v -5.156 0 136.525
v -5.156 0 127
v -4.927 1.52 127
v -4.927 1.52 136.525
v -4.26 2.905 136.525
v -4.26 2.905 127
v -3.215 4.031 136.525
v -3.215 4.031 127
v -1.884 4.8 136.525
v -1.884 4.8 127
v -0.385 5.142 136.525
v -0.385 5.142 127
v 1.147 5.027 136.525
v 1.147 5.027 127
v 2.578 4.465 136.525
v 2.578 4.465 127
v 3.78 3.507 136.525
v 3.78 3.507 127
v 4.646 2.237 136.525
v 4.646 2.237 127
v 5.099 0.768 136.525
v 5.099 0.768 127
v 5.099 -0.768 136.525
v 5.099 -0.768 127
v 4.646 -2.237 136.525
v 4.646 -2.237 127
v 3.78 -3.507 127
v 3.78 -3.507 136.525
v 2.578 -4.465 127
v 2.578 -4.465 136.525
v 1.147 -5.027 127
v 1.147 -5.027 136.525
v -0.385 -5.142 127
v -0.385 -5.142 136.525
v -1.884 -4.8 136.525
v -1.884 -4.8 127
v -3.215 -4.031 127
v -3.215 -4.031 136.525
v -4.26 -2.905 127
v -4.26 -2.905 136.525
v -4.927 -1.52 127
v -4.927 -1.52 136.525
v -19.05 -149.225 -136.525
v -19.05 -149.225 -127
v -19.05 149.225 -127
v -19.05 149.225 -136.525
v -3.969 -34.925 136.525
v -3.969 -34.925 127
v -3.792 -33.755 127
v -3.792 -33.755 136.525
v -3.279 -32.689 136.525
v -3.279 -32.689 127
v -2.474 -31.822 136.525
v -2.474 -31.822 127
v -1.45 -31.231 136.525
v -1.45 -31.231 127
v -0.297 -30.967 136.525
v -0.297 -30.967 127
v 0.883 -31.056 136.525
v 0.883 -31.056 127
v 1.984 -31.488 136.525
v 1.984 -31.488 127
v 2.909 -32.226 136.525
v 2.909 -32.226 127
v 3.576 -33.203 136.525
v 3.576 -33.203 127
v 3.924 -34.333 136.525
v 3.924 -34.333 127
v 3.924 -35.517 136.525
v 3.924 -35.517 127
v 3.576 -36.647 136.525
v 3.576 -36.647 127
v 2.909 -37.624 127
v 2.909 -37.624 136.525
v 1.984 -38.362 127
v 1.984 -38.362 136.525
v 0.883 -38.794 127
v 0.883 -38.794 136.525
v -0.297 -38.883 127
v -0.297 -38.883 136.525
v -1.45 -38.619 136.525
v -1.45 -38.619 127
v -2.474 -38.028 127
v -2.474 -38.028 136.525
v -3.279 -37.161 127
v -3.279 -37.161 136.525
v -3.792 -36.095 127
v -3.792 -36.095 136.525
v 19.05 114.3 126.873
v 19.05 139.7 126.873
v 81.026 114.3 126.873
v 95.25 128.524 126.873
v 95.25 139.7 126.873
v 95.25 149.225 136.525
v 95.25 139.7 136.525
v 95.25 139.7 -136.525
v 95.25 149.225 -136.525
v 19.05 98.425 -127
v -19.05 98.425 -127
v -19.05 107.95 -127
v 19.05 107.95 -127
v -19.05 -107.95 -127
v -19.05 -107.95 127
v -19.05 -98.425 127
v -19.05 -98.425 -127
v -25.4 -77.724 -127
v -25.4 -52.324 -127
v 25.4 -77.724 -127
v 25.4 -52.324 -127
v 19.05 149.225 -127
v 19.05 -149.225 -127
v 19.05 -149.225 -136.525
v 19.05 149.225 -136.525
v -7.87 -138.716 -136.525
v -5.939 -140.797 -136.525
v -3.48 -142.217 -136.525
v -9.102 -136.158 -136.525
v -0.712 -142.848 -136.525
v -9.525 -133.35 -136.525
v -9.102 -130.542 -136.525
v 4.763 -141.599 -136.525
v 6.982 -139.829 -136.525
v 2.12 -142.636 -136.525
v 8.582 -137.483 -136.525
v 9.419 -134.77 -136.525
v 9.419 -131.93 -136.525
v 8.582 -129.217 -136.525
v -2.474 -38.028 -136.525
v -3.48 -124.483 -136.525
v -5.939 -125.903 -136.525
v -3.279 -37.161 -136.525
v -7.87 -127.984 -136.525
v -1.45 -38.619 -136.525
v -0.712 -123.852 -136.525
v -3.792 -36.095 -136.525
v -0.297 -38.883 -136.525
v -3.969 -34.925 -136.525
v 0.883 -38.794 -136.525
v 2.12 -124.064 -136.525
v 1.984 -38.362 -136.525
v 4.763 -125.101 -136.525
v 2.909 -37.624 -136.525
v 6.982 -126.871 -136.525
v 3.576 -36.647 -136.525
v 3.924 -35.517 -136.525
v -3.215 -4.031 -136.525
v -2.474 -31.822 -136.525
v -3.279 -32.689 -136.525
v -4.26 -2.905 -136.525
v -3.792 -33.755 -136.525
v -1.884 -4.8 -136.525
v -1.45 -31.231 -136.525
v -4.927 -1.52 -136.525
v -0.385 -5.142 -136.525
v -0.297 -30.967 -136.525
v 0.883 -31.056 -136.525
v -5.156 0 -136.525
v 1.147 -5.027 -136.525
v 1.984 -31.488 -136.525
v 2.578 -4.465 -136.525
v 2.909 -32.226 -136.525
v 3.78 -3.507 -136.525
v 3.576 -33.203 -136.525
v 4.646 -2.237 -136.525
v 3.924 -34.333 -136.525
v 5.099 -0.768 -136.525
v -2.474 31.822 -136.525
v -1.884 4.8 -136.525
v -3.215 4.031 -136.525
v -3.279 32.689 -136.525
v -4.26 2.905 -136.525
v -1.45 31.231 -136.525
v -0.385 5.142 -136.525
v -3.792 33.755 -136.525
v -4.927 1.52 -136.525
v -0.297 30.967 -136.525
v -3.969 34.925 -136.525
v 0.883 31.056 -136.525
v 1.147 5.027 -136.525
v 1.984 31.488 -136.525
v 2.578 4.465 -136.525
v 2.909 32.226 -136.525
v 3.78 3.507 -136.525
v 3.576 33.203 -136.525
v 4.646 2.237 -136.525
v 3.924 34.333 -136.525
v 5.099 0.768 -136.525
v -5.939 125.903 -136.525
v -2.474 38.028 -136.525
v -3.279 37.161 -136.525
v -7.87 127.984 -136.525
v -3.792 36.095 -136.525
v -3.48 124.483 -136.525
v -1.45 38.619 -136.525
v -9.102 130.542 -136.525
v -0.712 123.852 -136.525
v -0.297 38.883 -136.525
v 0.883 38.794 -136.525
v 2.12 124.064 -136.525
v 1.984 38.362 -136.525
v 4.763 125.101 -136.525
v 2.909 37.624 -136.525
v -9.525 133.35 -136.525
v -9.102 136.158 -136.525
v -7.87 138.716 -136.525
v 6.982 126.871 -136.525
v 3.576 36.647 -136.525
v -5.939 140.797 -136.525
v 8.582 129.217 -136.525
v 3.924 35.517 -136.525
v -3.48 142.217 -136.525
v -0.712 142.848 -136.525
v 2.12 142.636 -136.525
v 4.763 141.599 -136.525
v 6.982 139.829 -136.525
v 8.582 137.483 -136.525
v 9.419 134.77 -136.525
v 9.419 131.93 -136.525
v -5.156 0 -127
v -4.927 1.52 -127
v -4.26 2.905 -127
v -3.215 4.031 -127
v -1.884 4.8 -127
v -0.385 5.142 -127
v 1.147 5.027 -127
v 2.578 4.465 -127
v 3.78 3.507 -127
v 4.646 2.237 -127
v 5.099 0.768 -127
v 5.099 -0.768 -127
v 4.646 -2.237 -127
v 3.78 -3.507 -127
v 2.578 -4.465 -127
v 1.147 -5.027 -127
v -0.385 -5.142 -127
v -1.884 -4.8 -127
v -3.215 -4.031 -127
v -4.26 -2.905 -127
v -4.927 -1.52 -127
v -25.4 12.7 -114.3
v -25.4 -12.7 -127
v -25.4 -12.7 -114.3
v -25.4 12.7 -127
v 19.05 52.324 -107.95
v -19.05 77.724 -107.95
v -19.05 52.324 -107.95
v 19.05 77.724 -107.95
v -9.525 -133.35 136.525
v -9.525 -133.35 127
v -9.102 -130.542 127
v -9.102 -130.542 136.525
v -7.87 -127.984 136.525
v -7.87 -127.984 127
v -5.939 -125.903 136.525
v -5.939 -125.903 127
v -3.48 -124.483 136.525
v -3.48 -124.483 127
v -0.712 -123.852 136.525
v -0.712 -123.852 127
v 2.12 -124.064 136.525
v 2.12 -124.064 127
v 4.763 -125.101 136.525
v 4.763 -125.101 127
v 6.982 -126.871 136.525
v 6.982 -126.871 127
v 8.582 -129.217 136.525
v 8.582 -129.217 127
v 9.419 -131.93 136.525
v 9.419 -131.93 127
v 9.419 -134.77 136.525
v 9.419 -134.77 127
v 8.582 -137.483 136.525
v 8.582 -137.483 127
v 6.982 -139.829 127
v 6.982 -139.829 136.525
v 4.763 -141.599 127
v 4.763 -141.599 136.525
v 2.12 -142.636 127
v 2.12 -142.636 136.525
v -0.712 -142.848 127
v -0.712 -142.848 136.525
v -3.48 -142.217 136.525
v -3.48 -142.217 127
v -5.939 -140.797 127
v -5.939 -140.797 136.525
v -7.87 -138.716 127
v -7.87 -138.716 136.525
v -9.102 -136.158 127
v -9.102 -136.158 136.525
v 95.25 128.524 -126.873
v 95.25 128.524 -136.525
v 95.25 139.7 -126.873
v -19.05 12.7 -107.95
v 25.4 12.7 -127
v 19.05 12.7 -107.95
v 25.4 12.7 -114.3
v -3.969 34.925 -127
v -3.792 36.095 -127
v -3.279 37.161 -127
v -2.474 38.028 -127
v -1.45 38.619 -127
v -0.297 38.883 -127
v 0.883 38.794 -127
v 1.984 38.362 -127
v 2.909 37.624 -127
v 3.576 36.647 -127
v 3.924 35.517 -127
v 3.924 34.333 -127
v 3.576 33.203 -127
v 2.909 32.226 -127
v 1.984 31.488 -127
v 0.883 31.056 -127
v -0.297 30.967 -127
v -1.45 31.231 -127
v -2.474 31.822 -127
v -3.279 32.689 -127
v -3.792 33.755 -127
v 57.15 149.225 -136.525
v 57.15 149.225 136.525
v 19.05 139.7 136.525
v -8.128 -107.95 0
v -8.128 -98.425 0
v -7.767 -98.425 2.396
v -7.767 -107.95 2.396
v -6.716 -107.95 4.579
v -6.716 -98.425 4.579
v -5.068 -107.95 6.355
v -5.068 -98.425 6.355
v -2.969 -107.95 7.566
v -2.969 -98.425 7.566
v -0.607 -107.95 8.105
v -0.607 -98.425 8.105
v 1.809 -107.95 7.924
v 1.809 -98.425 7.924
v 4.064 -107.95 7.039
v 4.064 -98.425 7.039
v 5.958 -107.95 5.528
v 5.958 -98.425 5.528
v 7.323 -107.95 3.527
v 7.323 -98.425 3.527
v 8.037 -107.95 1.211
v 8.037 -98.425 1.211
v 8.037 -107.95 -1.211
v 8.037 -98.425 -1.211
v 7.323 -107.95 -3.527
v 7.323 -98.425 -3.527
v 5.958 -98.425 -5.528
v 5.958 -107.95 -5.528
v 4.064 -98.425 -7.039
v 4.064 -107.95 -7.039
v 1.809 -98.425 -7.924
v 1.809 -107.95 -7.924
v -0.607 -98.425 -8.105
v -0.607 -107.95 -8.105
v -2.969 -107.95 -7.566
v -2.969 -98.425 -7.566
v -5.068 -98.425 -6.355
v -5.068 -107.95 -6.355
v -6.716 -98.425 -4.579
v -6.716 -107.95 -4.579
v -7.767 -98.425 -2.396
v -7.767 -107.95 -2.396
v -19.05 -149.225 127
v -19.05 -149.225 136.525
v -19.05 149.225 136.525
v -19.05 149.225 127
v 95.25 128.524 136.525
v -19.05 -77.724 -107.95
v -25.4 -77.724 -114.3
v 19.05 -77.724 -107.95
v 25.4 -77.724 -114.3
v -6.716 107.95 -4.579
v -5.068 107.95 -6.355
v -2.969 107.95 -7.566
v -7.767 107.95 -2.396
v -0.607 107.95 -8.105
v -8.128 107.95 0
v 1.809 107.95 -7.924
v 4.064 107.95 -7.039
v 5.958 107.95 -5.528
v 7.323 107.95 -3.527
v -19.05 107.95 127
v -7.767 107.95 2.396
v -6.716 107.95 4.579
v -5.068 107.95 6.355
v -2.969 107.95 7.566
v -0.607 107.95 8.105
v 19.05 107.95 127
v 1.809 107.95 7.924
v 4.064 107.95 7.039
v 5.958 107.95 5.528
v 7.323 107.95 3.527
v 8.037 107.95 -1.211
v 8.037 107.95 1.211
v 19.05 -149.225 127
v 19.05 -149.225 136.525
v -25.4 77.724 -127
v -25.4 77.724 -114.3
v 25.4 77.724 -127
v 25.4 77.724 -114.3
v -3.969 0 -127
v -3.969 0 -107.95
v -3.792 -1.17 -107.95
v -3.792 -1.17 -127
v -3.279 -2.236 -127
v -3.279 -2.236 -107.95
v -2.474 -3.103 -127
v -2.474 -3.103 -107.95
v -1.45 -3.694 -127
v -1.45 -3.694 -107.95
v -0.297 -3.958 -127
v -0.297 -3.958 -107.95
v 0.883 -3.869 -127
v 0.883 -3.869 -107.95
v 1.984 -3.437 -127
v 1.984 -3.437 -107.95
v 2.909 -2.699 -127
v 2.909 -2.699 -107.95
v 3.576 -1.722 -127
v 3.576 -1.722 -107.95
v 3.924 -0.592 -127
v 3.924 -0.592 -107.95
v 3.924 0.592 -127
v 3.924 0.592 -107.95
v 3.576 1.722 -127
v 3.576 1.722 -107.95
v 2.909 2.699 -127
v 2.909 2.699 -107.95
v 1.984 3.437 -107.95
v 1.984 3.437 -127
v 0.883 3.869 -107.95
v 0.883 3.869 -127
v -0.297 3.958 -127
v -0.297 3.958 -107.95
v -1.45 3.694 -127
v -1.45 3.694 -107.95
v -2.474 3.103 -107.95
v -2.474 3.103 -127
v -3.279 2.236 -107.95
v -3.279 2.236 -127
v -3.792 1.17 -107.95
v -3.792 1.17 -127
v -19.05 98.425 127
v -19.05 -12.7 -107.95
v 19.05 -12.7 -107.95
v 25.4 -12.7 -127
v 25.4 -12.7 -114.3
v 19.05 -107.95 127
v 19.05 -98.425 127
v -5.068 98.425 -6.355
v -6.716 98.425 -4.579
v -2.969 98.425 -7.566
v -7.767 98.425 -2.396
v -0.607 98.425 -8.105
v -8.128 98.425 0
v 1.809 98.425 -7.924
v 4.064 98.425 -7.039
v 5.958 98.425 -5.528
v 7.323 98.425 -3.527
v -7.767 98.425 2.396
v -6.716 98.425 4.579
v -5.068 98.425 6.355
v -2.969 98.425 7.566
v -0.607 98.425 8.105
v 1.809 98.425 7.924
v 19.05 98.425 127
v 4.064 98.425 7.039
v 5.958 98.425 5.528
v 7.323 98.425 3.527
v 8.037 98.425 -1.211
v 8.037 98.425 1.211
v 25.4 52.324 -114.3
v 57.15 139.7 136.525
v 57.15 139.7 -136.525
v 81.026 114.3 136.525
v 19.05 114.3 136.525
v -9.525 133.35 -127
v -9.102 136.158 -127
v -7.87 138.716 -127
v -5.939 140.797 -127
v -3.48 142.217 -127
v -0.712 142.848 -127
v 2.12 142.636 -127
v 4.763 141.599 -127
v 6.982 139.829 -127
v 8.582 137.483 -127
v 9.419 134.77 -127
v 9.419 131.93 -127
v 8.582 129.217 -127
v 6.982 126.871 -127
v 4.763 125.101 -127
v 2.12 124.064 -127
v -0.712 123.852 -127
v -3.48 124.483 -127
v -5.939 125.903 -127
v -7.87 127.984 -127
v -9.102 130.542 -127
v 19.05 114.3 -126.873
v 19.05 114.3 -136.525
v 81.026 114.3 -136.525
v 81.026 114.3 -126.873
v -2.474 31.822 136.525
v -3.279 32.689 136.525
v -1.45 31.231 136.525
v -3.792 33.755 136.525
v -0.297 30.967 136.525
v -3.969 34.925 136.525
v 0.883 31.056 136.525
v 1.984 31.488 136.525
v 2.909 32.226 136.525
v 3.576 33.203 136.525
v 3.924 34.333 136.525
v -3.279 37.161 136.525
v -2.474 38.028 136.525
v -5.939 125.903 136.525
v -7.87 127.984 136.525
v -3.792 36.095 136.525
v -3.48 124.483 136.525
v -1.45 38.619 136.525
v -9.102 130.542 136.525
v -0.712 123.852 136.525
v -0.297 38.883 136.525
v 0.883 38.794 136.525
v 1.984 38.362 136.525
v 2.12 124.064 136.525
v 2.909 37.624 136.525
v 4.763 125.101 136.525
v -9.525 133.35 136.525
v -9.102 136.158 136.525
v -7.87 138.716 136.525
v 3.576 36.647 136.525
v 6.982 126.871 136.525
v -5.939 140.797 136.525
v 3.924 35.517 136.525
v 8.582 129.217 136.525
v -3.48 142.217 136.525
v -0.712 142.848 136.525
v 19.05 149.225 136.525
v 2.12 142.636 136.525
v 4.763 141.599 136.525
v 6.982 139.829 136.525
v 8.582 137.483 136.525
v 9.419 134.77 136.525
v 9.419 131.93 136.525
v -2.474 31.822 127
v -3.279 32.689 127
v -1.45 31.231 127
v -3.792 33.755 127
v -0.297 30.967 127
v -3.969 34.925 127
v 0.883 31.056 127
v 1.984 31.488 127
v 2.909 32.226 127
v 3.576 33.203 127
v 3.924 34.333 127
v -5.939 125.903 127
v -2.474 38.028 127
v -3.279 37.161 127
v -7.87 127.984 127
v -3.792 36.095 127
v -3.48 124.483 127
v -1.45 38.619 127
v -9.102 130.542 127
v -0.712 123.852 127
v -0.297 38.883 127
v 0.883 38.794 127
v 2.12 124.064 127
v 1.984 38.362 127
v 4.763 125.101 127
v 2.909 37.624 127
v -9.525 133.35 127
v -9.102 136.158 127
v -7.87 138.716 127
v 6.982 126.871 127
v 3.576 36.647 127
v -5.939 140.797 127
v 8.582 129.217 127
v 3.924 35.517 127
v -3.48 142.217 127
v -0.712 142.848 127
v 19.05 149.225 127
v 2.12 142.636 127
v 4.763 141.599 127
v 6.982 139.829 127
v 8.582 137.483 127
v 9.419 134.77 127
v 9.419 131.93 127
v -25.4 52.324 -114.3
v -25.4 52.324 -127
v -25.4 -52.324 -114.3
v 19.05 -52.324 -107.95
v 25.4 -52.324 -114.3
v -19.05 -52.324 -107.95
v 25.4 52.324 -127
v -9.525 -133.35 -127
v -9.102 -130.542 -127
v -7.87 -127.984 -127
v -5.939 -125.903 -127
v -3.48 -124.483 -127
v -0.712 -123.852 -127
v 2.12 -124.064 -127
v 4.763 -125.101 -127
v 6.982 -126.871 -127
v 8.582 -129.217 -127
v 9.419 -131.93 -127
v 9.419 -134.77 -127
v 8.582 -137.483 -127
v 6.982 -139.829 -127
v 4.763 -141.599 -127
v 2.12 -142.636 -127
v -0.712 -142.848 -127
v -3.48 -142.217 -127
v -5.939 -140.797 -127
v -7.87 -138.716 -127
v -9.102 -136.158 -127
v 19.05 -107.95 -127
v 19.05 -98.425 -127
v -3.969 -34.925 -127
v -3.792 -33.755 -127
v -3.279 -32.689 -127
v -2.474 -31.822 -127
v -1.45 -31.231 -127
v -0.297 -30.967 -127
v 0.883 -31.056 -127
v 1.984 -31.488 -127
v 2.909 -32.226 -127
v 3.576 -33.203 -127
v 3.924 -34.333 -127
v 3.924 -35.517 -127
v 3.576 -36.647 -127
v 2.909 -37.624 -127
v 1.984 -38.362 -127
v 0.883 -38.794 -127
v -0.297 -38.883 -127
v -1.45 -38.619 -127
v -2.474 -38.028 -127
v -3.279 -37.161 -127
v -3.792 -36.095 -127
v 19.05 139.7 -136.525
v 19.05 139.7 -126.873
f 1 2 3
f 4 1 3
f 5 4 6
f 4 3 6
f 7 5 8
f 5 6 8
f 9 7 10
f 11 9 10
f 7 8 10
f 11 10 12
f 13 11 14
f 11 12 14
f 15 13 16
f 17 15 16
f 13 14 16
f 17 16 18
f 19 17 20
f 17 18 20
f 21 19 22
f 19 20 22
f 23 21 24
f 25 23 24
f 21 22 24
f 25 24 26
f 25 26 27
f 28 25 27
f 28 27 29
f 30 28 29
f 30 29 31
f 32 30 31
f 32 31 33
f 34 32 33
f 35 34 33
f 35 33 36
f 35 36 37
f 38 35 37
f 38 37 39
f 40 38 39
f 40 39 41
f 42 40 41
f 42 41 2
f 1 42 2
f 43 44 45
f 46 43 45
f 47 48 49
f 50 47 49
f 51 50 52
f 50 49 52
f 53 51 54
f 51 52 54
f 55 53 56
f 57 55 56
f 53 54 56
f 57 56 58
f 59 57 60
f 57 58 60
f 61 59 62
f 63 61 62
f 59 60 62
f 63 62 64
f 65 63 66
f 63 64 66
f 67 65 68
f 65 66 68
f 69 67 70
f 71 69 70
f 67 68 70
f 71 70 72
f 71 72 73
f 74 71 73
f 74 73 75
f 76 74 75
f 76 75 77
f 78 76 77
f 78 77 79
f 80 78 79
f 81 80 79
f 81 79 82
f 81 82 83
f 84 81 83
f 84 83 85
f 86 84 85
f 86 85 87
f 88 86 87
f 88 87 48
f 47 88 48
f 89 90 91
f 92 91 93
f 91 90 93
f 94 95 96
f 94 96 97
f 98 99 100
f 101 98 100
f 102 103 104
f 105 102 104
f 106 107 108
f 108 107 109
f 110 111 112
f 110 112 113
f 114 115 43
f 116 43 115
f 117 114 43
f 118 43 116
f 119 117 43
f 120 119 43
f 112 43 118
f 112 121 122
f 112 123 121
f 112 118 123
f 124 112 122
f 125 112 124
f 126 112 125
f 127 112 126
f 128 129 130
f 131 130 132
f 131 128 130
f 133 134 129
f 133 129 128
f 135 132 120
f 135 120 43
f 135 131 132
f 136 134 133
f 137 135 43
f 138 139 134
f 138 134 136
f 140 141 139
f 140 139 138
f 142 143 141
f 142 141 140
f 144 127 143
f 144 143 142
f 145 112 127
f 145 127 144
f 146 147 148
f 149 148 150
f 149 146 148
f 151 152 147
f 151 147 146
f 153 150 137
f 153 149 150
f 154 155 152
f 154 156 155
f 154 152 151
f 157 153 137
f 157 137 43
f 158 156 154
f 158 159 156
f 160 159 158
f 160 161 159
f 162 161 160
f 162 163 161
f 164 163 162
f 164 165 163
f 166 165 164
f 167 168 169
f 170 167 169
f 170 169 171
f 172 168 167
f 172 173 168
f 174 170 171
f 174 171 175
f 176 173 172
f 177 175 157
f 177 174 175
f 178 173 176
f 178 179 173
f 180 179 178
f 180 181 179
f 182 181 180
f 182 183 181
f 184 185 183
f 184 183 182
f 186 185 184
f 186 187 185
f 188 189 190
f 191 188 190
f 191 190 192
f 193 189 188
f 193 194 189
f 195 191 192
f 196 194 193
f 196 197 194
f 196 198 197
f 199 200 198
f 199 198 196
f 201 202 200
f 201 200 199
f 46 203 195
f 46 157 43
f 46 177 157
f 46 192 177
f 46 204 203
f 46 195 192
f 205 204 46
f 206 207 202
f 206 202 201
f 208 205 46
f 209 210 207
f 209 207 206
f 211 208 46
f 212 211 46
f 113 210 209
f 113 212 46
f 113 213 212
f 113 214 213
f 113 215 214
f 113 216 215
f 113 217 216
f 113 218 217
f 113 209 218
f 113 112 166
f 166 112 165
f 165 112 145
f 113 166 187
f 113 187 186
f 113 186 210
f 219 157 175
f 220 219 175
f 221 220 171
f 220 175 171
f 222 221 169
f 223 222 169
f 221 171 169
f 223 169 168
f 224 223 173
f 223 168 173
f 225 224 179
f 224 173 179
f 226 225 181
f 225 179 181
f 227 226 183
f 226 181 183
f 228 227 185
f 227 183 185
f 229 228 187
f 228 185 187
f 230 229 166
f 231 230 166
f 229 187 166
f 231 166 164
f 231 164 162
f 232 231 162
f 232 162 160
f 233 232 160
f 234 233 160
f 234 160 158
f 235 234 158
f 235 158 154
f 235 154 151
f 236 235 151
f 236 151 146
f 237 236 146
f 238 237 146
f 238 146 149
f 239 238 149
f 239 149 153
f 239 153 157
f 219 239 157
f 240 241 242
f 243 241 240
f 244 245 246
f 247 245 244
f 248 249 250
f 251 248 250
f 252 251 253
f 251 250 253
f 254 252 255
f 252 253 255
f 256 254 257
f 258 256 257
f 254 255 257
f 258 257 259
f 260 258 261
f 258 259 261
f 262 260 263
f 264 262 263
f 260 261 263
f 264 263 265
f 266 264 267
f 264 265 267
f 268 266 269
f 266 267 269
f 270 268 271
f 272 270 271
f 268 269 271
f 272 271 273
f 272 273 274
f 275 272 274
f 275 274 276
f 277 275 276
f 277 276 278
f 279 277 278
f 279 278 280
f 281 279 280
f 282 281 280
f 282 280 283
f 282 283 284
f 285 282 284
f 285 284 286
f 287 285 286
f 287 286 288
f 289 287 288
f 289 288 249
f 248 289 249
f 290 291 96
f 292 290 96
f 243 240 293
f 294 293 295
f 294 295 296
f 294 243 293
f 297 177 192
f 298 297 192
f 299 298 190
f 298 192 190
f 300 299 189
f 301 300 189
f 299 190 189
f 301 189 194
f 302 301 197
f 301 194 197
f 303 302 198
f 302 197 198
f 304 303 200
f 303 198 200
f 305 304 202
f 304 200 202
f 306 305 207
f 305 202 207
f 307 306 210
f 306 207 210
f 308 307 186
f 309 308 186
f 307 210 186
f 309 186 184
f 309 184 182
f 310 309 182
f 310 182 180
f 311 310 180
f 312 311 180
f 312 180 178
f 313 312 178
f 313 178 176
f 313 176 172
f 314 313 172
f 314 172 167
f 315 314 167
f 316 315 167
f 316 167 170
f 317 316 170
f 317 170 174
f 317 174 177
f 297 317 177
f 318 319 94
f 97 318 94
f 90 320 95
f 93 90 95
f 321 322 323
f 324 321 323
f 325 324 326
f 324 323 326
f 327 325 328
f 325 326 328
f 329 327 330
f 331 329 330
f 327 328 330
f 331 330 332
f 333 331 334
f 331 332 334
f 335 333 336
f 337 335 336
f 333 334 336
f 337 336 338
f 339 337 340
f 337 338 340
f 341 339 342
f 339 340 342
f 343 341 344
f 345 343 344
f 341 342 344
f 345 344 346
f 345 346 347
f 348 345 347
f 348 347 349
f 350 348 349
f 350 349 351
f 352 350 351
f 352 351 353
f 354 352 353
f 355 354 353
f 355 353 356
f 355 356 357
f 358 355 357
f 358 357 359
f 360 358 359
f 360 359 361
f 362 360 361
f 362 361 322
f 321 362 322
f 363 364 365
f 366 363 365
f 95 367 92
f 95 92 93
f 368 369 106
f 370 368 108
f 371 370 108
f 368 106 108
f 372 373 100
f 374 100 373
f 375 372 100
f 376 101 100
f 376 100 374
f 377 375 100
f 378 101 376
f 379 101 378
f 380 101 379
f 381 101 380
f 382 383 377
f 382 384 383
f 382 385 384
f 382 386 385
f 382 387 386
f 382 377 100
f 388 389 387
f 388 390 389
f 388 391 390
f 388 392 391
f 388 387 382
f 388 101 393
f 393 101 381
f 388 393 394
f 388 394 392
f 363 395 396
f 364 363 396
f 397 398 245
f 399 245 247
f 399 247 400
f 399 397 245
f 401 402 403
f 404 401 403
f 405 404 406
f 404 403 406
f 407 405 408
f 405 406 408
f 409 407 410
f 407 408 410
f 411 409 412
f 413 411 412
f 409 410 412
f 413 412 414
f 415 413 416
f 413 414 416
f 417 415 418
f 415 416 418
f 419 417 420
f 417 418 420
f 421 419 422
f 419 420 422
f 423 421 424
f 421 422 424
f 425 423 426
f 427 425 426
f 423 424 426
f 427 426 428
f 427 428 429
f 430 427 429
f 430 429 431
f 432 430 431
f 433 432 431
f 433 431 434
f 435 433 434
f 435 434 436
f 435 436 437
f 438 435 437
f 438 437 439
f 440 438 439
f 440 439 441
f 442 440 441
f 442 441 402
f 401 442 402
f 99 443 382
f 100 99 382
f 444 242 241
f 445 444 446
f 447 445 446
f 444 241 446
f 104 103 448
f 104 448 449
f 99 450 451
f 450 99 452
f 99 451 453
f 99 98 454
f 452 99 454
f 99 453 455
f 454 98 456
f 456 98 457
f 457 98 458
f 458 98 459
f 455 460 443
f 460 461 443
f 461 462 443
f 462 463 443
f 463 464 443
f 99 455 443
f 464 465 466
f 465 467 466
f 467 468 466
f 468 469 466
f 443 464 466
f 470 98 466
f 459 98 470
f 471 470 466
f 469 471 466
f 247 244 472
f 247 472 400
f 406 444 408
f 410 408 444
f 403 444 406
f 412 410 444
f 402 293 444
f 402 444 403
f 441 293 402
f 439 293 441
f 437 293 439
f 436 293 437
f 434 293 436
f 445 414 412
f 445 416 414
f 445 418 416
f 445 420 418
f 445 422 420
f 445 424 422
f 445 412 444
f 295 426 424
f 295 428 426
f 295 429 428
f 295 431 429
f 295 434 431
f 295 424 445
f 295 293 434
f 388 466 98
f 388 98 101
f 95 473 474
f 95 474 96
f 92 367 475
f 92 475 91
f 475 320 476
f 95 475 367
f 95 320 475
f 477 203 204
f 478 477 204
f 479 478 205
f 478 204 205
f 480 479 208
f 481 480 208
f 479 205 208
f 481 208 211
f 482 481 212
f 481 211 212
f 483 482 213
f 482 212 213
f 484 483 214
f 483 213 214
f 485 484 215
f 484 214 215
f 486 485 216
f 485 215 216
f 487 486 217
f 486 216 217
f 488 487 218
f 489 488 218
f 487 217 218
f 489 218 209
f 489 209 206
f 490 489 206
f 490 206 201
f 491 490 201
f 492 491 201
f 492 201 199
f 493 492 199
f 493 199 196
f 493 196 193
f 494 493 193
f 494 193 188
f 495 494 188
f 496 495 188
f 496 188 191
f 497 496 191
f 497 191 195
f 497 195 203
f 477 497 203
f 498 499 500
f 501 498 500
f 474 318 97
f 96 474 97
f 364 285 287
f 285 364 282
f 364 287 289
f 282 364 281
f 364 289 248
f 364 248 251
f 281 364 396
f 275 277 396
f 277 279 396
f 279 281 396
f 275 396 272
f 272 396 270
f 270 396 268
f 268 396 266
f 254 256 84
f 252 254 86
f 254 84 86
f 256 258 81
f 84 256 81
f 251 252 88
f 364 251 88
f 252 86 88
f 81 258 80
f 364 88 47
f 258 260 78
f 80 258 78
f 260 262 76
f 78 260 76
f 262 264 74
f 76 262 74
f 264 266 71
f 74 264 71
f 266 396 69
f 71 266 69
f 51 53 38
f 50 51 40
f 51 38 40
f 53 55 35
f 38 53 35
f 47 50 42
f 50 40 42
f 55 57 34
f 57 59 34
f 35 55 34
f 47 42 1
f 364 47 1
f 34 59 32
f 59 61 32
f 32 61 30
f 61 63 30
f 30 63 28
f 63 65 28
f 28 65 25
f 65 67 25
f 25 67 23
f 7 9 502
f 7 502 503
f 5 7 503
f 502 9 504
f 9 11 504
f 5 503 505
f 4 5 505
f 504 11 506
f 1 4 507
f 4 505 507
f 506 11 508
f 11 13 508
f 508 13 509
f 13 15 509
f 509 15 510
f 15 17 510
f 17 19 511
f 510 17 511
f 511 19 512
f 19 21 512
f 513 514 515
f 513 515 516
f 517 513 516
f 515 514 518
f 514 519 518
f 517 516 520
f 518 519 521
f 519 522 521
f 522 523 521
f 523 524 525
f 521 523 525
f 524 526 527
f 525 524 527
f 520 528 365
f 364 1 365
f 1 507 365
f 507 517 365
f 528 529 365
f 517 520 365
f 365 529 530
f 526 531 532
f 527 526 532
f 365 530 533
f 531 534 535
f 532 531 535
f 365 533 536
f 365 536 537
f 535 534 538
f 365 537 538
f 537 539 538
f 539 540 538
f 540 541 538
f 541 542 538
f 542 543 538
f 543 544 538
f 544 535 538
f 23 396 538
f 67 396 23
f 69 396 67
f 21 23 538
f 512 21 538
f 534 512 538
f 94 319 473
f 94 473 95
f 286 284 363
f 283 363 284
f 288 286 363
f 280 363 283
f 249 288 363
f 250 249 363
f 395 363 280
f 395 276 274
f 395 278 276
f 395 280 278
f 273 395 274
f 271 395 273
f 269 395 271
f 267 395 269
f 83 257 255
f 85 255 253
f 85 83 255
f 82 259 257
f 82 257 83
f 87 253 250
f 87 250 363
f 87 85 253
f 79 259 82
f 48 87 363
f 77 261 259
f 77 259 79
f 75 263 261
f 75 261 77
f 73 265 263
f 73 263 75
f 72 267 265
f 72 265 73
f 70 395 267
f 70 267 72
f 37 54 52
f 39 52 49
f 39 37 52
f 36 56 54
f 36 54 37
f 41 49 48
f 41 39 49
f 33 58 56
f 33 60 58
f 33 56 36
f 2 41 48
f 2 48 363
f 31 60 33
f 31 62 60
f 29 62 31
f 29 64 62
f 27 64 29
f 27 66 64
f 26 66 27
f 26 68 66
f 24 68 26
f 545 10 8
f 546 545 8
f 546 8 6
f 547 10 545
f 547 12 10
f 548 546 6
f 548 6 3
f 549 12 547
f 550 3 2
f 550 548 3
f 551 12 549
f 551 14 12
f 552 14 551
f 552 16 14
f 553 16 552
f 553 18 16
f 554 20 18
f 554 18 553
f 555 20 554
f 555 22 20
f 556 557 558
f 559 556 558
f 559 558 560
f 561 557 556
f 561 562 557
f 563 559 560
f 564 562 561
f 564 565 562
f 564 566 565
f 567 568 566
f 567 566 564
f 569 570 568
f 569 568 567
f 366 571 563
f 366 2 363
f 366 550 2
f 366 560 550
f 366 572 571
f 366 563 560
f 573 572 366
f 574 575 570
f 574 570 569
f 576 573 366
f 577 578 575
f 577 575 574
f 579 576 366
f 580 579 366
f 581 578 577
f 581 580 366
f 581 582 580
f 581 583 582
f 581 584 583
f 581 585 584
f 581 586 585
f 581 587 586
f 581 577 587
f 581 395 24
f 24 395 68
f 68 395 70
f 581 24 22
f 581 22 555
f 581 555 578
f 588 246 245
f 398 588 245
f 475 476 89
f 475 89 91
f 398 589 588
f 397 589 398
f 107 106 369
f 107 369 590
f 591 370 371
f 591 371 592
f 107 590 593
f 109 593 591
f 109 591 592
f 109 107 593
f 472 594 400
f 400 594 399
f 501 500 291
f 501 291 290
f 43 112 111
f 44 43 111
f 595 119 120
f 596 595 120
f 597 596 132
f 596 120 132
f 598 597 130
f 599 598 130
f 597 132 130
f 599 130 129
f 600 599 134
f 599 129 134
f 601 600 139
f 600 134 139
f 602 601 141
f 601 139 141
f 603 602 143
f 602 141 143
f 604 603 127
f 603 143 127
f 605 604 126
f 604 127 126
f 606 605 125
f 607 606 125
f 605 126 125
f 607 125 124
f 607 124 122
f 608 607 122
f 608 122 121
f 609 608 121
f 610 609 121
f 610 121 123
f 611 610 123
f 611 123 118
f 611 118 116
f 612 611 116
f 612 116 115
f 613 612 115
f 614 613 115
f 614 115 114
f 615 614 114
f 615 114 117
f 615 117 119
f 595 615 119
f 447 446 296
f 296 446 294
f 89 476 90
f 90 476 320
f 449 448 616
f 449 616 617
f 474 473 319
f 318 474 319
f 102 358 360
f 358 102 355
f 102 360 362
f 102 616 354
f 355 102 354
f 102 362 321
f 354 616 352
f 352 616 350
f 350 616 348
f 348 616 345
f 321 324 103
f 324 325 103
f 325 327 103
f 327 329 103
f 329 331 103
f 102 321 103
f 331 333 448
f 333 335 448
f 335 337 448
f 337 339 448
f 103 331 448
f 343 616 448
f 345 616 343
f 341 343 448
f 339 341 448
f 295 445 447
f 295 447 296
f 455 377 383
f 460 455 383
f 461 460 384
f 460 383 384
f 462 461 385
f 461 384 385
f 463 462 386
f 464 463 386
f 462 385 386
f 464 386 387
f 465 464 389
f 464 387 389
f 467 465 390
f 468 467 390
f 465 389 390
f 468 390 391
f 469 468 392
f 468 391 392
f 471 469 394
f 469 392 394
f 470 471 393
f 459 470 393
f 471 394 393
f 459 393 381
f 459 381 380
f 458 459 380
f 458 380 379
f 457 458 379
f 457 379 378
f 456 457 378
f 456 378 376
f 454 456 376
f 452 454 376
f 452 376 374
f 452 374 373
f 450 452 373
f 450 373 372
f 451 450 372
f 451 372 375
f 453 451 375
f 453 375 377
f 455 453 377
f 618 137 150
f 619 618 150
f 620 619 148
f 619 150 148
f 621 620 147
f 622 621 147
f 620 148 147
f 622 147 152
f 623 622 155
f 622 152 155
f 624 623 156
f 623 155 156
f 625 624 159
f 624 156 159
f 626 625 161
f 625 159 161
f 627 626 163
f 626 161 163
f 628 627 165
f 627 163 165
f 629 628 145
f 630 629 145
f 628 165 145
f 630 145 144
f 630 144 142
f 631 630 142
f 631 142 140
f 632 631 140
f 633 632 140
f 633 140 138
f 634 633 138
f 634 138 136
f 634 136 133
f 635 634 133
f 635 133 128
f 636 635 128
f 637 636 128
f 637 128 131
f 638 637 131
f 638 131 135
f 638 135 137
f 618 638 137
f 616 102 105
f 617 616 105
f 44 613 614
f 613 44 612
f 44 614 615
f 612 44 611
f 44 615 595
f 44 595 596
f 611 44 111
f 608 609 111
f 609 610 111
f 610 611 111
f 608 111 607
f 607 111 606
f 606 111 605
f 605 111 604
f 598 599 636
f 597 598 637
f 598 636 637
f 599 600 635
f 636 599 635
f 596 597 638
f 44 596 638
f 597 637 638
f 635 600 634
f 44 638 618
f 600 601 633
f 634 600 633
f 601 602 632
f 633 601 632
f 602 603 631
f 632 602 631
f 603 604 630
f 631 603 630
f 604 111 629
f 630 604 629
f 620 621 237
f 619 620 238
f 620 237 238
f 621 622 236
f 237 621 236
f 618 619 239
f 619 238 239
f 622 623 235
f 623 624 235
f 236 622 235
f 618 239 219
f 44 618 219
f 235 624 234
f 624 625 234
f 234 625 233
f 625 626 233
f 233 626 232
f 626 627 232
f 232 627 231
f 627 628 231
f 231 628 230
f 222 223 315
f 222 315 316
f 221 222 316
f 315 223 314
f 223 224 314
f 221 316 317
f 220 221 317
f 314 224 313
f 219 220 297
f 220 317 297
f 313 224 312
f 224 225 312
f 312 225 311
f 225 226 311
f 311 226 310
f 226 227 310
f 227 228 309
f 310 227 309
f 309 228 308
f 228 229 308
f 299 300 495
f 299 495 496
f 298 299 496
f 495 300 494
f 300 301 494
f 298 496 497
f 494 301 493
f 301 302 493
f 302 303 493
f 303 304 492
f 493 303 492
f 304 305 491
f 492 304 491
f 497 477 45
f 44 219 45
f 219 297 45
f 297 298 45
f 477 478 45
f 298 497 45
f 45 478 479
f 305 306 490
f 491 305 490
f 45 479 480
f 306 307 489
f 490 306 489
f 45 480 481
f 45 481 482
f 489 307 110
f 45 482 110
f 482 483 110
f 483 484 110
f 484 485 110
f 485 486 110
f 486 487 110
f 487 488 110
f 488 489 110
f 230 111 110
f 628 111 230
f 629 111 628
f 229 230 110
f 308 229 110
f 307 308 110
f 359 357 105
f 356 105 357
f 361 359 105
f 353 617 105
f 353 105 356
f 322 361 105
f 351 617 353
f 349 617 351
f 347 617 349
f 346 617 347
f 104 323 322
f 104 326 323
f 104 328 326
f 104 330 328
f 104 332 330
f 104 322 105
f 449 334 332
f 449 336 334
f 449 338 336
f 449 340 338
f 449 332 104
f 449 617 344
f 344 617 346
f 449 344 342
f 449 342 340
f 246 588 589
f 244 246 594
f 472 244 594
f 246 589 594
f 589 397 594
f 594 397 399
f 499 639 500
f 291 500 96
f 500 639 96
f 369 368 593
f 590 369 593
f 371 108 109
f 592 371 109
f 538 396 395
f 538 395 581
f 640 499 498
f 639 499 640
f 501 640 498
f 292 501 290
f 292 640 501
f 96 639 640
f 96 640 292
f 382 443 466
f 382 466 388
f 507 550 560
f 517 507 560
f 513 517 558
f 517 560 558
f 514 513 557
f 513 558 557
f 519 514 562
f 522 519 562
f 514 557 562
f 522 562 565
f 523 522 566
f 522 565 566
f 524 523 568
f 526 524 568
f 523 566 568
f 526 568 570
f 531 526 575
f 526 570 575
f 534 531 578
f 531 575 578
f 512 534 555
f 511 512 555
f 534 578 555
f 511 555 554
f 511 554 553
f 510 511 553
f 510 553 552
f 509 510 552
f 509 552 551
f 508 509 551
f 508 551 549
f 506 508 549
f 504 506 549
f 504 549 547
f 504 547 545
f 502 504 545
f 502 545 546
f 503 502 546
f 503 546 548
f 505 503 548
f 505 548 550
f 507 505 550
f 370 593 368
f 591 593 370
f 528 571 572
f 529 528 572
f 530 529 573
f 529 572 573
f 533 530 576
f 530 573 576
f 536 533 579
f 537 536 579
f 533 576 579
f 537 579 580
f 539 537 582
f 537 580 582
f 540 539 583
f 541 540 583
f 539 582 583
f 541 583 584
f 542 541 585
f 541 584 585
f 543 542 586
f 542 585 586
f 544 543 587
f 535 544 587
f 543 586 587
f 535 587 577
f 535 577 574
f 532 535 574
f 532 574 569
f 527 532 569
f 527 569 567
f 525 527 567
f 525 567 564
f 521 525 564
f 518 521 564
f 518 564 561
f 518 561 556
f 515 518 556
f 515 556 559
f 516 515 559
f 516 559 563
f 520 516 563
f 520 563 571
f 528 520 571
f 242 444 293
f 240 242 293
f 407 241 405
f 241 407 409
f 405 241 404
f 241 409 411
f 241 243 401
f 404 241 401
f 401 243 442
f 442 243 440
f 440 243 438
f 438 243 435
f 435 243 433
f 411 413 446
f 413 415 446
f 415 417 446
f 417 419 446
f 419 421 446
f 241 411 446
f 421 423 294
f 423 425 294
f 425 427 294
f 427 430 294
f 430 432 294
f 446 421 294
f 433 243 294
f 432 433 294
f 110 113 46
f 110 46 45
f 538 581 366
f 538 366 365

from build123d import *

# Parameters (mm, degrees)
F0_W       = 298.45
F0_H       = 9.525
F1_DEPTH   = 19.05
F2_W       = 9.525
F2_H       = 254
F3_DEPTH   = 19.05
F5_D       = 19.05
F5_2_D     = 19.05
F7_D       = 7.9375
F7_2_D     = 7.9375
F8_D       = 10.3124
F8_2_D     = 10.3124
F10_D      = 16.256
F10_2_D    = 16.256
F11_W      = 50.8
F11_H      = 25.4
F12_DEPTH  = 19.05
F13_SIZE   = 6.35
F13_2_SIZE = 6.35
F13_3_SIZE = 6.35
F14_W      = 76.2
F14_H      = 25.4
F15_DEPTH  = 9.652
F16_SIZE   = 14.224
F18_W      = 38.1
F18_H      = 9.525
F19_DEPTH  = 273.05
F21_D      = 7.9375


with BuildPart() as f1:
    # F0 (on Right) → F1 (new body, symmetric)
    with BuildSketch(Plane.YZ):
        with Locations((0, 131.7625)):
            Rectangle(F0_W, F0_H)
    extrude(amount=F1_DEPTH, both=True)

    # F5 (through all)
    with Locations(Plane.XY.offset(136.525)):
        with Locations((0, -133.35), (0, 133.35)):
            Hole(F5_D / 2)

    # F7 (through all)
    with Locations(Plane.XY.offset(136.525)):
        with Locations((0, -34.925), (0, 34.925)):
            Hole(F7_D / 2)

    # F8 (through all)
    with Locations(Plane.XY.offset(136.525)):
        with Locations((0, 0)):
            Hole(F8_D / 2)


with BuildPart() as f1b:
    # F0 (on Right) → F1, piece 2 (new body, symmetric)
    with BuildSketch(Plane.YZ):
        with Locations((0, -131.7625)):
            Rectangle(F0_W, F0_H)
    extrude(amount=F1_DEPTH, both=True)

    # F5#2 (through all)
    with Locations(Plane.XY.offset(136.525)):
        with Locations((0, -133.35), (0, 133.35)):
            Hole(F5_2_D / 2)

    # F7#2 (through all)
    with Locations(Plane.XY.offset(136.525)):
        with Locations((0, -34.925), (0, 34.925)):
            Hole(F7_2_D / 2)

    # F8#2 (through all)
    with Locations(Plane.XY.offset(136.525)):
        with Locations((0, 0)):
            Hole(F8_2_D / 2)


with BuildPart() as f3:
    # F2 (on Right) → F3 (new body, symmetric)
    with BuildSketch(Plane.YZ):
        with Locations((-103.1875, 0)):
            Rectangle(F2_W, F2_H)
    extrude(amount=F3_DEPTH, both=True)

    # F10 (through all)
    with Locations(Plane.XZ.offset(107.95)):
        with Locations((0, 0)):
            Hole(F10_D / 2)


with BuildPart() as f3b:
    # F2 (on Right) → F3, piece 2 (new body, symmetric)
    with BuildSketch(Plane.YZ):
        with Locations((103.1875, 0)):
            Rectangle(F2_W, F2_H)
    extrude(amount=F3_DEPTH, both=True)

    # F10#2 (through all)
    with Locations(Plane.XZ.offset(107.95)):
        with Locations((0, 0)):
            Hole(F10_2_D / 2)


with BuildPart() as f12:
    # F11 (on face) → F12 (new body)
    with BuildSketch(Plane.XY.offset(-127)):
        Rectangle(F11_W, F11_H)
    extrude(amount=F12_DEPTH)

    # F13#2
    f13_2_edges = [f12.edges().sort_by_distance(p)[0] for p in [
        (-25.4, 0, -107.95),
        (25.4, 0, -107.95),
    ]]
    chamfer(f13_2_edges, length=F13_2_SIZE)

    # F21 (through all)
    with Locations(Plane(origin=(0, 0, -127), x_dir=(1, 0, 0), z_dir=(0, 0, -1))):
        with Locations((0, 0)):
            Hole(F21_D / 2)


with BuildPart() as f12b:
    # F11 (on face) → F12, piece 2 (new body)
    with BuildSketch(Plane.XY.offset(-127)):
        with Locations((0, 65.024)):
            Rectangle(F11_W, F11_H)
    extrude(amount=F12_DEPTH)

    # F13#3
    f13_3_edges = [f12b.edges().sort_by_distance(p)[0] for p in [
        (25.4, 65.024, -107.95),
        (-25.4, 65.024, -107.95),
    ]]
    chamfer(f13_3_edges, length=F13_3_SIZE)


with BuildPart() as f12c:
    # F11 (on face) → F12, piece 3 (new body)
    with BuildSketch(Plane.XY.offset(-127)):
        with Locations((0, -65.024)):
            Rectangle(F11_W, F11_H)
    extrude(amount=F12_DEPTH)

    # F13
    f13_edges = [f12c.edges().sort_by_distance(p)[0] for p in [
        (25.4, -65.024, -107.95),
        (-25.4, -65.024, -107.95),
    ]]
    chamfer(f13_edges, length=F13_SIZE)


with BuildPart() as f15:
    # F14 (on face) → F15 (new body)
    with BuildSketch(Plane.XY.offset(136.525)):
        with Locations((57.15, 127)):
            Rectangle(F14_W, F14_H)
    extrude(amount=-F15_DEPTH)

    # F16
    f16_edges = [f15.edges().sort_by_distance(p)[0] for p in [
        (95.25, 114.3, 131.699),
    ]]
    chamfer(f16_edges, length=F16_SIZE)


with BuildPart() as f17_1:
    # F17: instance of F15
    add(f15.part.mirror(Plane.XY))


with BuildPart() as f19:
    # F18 (on face) → F19 (new body)
    with BuildSketch(Plane.XY.offset(136.525)):
        with Locations((76.2, 144.4625)):
            Rectangle(F18_W, F18_H)
    extrude(amount=-F19_DEPTH)


solid = Compound([f1.part, f1b.part, f3.part, f3b.part, f12.part, f12b.part, f12c.part, f15.part, f17_1.part, f19.part])
